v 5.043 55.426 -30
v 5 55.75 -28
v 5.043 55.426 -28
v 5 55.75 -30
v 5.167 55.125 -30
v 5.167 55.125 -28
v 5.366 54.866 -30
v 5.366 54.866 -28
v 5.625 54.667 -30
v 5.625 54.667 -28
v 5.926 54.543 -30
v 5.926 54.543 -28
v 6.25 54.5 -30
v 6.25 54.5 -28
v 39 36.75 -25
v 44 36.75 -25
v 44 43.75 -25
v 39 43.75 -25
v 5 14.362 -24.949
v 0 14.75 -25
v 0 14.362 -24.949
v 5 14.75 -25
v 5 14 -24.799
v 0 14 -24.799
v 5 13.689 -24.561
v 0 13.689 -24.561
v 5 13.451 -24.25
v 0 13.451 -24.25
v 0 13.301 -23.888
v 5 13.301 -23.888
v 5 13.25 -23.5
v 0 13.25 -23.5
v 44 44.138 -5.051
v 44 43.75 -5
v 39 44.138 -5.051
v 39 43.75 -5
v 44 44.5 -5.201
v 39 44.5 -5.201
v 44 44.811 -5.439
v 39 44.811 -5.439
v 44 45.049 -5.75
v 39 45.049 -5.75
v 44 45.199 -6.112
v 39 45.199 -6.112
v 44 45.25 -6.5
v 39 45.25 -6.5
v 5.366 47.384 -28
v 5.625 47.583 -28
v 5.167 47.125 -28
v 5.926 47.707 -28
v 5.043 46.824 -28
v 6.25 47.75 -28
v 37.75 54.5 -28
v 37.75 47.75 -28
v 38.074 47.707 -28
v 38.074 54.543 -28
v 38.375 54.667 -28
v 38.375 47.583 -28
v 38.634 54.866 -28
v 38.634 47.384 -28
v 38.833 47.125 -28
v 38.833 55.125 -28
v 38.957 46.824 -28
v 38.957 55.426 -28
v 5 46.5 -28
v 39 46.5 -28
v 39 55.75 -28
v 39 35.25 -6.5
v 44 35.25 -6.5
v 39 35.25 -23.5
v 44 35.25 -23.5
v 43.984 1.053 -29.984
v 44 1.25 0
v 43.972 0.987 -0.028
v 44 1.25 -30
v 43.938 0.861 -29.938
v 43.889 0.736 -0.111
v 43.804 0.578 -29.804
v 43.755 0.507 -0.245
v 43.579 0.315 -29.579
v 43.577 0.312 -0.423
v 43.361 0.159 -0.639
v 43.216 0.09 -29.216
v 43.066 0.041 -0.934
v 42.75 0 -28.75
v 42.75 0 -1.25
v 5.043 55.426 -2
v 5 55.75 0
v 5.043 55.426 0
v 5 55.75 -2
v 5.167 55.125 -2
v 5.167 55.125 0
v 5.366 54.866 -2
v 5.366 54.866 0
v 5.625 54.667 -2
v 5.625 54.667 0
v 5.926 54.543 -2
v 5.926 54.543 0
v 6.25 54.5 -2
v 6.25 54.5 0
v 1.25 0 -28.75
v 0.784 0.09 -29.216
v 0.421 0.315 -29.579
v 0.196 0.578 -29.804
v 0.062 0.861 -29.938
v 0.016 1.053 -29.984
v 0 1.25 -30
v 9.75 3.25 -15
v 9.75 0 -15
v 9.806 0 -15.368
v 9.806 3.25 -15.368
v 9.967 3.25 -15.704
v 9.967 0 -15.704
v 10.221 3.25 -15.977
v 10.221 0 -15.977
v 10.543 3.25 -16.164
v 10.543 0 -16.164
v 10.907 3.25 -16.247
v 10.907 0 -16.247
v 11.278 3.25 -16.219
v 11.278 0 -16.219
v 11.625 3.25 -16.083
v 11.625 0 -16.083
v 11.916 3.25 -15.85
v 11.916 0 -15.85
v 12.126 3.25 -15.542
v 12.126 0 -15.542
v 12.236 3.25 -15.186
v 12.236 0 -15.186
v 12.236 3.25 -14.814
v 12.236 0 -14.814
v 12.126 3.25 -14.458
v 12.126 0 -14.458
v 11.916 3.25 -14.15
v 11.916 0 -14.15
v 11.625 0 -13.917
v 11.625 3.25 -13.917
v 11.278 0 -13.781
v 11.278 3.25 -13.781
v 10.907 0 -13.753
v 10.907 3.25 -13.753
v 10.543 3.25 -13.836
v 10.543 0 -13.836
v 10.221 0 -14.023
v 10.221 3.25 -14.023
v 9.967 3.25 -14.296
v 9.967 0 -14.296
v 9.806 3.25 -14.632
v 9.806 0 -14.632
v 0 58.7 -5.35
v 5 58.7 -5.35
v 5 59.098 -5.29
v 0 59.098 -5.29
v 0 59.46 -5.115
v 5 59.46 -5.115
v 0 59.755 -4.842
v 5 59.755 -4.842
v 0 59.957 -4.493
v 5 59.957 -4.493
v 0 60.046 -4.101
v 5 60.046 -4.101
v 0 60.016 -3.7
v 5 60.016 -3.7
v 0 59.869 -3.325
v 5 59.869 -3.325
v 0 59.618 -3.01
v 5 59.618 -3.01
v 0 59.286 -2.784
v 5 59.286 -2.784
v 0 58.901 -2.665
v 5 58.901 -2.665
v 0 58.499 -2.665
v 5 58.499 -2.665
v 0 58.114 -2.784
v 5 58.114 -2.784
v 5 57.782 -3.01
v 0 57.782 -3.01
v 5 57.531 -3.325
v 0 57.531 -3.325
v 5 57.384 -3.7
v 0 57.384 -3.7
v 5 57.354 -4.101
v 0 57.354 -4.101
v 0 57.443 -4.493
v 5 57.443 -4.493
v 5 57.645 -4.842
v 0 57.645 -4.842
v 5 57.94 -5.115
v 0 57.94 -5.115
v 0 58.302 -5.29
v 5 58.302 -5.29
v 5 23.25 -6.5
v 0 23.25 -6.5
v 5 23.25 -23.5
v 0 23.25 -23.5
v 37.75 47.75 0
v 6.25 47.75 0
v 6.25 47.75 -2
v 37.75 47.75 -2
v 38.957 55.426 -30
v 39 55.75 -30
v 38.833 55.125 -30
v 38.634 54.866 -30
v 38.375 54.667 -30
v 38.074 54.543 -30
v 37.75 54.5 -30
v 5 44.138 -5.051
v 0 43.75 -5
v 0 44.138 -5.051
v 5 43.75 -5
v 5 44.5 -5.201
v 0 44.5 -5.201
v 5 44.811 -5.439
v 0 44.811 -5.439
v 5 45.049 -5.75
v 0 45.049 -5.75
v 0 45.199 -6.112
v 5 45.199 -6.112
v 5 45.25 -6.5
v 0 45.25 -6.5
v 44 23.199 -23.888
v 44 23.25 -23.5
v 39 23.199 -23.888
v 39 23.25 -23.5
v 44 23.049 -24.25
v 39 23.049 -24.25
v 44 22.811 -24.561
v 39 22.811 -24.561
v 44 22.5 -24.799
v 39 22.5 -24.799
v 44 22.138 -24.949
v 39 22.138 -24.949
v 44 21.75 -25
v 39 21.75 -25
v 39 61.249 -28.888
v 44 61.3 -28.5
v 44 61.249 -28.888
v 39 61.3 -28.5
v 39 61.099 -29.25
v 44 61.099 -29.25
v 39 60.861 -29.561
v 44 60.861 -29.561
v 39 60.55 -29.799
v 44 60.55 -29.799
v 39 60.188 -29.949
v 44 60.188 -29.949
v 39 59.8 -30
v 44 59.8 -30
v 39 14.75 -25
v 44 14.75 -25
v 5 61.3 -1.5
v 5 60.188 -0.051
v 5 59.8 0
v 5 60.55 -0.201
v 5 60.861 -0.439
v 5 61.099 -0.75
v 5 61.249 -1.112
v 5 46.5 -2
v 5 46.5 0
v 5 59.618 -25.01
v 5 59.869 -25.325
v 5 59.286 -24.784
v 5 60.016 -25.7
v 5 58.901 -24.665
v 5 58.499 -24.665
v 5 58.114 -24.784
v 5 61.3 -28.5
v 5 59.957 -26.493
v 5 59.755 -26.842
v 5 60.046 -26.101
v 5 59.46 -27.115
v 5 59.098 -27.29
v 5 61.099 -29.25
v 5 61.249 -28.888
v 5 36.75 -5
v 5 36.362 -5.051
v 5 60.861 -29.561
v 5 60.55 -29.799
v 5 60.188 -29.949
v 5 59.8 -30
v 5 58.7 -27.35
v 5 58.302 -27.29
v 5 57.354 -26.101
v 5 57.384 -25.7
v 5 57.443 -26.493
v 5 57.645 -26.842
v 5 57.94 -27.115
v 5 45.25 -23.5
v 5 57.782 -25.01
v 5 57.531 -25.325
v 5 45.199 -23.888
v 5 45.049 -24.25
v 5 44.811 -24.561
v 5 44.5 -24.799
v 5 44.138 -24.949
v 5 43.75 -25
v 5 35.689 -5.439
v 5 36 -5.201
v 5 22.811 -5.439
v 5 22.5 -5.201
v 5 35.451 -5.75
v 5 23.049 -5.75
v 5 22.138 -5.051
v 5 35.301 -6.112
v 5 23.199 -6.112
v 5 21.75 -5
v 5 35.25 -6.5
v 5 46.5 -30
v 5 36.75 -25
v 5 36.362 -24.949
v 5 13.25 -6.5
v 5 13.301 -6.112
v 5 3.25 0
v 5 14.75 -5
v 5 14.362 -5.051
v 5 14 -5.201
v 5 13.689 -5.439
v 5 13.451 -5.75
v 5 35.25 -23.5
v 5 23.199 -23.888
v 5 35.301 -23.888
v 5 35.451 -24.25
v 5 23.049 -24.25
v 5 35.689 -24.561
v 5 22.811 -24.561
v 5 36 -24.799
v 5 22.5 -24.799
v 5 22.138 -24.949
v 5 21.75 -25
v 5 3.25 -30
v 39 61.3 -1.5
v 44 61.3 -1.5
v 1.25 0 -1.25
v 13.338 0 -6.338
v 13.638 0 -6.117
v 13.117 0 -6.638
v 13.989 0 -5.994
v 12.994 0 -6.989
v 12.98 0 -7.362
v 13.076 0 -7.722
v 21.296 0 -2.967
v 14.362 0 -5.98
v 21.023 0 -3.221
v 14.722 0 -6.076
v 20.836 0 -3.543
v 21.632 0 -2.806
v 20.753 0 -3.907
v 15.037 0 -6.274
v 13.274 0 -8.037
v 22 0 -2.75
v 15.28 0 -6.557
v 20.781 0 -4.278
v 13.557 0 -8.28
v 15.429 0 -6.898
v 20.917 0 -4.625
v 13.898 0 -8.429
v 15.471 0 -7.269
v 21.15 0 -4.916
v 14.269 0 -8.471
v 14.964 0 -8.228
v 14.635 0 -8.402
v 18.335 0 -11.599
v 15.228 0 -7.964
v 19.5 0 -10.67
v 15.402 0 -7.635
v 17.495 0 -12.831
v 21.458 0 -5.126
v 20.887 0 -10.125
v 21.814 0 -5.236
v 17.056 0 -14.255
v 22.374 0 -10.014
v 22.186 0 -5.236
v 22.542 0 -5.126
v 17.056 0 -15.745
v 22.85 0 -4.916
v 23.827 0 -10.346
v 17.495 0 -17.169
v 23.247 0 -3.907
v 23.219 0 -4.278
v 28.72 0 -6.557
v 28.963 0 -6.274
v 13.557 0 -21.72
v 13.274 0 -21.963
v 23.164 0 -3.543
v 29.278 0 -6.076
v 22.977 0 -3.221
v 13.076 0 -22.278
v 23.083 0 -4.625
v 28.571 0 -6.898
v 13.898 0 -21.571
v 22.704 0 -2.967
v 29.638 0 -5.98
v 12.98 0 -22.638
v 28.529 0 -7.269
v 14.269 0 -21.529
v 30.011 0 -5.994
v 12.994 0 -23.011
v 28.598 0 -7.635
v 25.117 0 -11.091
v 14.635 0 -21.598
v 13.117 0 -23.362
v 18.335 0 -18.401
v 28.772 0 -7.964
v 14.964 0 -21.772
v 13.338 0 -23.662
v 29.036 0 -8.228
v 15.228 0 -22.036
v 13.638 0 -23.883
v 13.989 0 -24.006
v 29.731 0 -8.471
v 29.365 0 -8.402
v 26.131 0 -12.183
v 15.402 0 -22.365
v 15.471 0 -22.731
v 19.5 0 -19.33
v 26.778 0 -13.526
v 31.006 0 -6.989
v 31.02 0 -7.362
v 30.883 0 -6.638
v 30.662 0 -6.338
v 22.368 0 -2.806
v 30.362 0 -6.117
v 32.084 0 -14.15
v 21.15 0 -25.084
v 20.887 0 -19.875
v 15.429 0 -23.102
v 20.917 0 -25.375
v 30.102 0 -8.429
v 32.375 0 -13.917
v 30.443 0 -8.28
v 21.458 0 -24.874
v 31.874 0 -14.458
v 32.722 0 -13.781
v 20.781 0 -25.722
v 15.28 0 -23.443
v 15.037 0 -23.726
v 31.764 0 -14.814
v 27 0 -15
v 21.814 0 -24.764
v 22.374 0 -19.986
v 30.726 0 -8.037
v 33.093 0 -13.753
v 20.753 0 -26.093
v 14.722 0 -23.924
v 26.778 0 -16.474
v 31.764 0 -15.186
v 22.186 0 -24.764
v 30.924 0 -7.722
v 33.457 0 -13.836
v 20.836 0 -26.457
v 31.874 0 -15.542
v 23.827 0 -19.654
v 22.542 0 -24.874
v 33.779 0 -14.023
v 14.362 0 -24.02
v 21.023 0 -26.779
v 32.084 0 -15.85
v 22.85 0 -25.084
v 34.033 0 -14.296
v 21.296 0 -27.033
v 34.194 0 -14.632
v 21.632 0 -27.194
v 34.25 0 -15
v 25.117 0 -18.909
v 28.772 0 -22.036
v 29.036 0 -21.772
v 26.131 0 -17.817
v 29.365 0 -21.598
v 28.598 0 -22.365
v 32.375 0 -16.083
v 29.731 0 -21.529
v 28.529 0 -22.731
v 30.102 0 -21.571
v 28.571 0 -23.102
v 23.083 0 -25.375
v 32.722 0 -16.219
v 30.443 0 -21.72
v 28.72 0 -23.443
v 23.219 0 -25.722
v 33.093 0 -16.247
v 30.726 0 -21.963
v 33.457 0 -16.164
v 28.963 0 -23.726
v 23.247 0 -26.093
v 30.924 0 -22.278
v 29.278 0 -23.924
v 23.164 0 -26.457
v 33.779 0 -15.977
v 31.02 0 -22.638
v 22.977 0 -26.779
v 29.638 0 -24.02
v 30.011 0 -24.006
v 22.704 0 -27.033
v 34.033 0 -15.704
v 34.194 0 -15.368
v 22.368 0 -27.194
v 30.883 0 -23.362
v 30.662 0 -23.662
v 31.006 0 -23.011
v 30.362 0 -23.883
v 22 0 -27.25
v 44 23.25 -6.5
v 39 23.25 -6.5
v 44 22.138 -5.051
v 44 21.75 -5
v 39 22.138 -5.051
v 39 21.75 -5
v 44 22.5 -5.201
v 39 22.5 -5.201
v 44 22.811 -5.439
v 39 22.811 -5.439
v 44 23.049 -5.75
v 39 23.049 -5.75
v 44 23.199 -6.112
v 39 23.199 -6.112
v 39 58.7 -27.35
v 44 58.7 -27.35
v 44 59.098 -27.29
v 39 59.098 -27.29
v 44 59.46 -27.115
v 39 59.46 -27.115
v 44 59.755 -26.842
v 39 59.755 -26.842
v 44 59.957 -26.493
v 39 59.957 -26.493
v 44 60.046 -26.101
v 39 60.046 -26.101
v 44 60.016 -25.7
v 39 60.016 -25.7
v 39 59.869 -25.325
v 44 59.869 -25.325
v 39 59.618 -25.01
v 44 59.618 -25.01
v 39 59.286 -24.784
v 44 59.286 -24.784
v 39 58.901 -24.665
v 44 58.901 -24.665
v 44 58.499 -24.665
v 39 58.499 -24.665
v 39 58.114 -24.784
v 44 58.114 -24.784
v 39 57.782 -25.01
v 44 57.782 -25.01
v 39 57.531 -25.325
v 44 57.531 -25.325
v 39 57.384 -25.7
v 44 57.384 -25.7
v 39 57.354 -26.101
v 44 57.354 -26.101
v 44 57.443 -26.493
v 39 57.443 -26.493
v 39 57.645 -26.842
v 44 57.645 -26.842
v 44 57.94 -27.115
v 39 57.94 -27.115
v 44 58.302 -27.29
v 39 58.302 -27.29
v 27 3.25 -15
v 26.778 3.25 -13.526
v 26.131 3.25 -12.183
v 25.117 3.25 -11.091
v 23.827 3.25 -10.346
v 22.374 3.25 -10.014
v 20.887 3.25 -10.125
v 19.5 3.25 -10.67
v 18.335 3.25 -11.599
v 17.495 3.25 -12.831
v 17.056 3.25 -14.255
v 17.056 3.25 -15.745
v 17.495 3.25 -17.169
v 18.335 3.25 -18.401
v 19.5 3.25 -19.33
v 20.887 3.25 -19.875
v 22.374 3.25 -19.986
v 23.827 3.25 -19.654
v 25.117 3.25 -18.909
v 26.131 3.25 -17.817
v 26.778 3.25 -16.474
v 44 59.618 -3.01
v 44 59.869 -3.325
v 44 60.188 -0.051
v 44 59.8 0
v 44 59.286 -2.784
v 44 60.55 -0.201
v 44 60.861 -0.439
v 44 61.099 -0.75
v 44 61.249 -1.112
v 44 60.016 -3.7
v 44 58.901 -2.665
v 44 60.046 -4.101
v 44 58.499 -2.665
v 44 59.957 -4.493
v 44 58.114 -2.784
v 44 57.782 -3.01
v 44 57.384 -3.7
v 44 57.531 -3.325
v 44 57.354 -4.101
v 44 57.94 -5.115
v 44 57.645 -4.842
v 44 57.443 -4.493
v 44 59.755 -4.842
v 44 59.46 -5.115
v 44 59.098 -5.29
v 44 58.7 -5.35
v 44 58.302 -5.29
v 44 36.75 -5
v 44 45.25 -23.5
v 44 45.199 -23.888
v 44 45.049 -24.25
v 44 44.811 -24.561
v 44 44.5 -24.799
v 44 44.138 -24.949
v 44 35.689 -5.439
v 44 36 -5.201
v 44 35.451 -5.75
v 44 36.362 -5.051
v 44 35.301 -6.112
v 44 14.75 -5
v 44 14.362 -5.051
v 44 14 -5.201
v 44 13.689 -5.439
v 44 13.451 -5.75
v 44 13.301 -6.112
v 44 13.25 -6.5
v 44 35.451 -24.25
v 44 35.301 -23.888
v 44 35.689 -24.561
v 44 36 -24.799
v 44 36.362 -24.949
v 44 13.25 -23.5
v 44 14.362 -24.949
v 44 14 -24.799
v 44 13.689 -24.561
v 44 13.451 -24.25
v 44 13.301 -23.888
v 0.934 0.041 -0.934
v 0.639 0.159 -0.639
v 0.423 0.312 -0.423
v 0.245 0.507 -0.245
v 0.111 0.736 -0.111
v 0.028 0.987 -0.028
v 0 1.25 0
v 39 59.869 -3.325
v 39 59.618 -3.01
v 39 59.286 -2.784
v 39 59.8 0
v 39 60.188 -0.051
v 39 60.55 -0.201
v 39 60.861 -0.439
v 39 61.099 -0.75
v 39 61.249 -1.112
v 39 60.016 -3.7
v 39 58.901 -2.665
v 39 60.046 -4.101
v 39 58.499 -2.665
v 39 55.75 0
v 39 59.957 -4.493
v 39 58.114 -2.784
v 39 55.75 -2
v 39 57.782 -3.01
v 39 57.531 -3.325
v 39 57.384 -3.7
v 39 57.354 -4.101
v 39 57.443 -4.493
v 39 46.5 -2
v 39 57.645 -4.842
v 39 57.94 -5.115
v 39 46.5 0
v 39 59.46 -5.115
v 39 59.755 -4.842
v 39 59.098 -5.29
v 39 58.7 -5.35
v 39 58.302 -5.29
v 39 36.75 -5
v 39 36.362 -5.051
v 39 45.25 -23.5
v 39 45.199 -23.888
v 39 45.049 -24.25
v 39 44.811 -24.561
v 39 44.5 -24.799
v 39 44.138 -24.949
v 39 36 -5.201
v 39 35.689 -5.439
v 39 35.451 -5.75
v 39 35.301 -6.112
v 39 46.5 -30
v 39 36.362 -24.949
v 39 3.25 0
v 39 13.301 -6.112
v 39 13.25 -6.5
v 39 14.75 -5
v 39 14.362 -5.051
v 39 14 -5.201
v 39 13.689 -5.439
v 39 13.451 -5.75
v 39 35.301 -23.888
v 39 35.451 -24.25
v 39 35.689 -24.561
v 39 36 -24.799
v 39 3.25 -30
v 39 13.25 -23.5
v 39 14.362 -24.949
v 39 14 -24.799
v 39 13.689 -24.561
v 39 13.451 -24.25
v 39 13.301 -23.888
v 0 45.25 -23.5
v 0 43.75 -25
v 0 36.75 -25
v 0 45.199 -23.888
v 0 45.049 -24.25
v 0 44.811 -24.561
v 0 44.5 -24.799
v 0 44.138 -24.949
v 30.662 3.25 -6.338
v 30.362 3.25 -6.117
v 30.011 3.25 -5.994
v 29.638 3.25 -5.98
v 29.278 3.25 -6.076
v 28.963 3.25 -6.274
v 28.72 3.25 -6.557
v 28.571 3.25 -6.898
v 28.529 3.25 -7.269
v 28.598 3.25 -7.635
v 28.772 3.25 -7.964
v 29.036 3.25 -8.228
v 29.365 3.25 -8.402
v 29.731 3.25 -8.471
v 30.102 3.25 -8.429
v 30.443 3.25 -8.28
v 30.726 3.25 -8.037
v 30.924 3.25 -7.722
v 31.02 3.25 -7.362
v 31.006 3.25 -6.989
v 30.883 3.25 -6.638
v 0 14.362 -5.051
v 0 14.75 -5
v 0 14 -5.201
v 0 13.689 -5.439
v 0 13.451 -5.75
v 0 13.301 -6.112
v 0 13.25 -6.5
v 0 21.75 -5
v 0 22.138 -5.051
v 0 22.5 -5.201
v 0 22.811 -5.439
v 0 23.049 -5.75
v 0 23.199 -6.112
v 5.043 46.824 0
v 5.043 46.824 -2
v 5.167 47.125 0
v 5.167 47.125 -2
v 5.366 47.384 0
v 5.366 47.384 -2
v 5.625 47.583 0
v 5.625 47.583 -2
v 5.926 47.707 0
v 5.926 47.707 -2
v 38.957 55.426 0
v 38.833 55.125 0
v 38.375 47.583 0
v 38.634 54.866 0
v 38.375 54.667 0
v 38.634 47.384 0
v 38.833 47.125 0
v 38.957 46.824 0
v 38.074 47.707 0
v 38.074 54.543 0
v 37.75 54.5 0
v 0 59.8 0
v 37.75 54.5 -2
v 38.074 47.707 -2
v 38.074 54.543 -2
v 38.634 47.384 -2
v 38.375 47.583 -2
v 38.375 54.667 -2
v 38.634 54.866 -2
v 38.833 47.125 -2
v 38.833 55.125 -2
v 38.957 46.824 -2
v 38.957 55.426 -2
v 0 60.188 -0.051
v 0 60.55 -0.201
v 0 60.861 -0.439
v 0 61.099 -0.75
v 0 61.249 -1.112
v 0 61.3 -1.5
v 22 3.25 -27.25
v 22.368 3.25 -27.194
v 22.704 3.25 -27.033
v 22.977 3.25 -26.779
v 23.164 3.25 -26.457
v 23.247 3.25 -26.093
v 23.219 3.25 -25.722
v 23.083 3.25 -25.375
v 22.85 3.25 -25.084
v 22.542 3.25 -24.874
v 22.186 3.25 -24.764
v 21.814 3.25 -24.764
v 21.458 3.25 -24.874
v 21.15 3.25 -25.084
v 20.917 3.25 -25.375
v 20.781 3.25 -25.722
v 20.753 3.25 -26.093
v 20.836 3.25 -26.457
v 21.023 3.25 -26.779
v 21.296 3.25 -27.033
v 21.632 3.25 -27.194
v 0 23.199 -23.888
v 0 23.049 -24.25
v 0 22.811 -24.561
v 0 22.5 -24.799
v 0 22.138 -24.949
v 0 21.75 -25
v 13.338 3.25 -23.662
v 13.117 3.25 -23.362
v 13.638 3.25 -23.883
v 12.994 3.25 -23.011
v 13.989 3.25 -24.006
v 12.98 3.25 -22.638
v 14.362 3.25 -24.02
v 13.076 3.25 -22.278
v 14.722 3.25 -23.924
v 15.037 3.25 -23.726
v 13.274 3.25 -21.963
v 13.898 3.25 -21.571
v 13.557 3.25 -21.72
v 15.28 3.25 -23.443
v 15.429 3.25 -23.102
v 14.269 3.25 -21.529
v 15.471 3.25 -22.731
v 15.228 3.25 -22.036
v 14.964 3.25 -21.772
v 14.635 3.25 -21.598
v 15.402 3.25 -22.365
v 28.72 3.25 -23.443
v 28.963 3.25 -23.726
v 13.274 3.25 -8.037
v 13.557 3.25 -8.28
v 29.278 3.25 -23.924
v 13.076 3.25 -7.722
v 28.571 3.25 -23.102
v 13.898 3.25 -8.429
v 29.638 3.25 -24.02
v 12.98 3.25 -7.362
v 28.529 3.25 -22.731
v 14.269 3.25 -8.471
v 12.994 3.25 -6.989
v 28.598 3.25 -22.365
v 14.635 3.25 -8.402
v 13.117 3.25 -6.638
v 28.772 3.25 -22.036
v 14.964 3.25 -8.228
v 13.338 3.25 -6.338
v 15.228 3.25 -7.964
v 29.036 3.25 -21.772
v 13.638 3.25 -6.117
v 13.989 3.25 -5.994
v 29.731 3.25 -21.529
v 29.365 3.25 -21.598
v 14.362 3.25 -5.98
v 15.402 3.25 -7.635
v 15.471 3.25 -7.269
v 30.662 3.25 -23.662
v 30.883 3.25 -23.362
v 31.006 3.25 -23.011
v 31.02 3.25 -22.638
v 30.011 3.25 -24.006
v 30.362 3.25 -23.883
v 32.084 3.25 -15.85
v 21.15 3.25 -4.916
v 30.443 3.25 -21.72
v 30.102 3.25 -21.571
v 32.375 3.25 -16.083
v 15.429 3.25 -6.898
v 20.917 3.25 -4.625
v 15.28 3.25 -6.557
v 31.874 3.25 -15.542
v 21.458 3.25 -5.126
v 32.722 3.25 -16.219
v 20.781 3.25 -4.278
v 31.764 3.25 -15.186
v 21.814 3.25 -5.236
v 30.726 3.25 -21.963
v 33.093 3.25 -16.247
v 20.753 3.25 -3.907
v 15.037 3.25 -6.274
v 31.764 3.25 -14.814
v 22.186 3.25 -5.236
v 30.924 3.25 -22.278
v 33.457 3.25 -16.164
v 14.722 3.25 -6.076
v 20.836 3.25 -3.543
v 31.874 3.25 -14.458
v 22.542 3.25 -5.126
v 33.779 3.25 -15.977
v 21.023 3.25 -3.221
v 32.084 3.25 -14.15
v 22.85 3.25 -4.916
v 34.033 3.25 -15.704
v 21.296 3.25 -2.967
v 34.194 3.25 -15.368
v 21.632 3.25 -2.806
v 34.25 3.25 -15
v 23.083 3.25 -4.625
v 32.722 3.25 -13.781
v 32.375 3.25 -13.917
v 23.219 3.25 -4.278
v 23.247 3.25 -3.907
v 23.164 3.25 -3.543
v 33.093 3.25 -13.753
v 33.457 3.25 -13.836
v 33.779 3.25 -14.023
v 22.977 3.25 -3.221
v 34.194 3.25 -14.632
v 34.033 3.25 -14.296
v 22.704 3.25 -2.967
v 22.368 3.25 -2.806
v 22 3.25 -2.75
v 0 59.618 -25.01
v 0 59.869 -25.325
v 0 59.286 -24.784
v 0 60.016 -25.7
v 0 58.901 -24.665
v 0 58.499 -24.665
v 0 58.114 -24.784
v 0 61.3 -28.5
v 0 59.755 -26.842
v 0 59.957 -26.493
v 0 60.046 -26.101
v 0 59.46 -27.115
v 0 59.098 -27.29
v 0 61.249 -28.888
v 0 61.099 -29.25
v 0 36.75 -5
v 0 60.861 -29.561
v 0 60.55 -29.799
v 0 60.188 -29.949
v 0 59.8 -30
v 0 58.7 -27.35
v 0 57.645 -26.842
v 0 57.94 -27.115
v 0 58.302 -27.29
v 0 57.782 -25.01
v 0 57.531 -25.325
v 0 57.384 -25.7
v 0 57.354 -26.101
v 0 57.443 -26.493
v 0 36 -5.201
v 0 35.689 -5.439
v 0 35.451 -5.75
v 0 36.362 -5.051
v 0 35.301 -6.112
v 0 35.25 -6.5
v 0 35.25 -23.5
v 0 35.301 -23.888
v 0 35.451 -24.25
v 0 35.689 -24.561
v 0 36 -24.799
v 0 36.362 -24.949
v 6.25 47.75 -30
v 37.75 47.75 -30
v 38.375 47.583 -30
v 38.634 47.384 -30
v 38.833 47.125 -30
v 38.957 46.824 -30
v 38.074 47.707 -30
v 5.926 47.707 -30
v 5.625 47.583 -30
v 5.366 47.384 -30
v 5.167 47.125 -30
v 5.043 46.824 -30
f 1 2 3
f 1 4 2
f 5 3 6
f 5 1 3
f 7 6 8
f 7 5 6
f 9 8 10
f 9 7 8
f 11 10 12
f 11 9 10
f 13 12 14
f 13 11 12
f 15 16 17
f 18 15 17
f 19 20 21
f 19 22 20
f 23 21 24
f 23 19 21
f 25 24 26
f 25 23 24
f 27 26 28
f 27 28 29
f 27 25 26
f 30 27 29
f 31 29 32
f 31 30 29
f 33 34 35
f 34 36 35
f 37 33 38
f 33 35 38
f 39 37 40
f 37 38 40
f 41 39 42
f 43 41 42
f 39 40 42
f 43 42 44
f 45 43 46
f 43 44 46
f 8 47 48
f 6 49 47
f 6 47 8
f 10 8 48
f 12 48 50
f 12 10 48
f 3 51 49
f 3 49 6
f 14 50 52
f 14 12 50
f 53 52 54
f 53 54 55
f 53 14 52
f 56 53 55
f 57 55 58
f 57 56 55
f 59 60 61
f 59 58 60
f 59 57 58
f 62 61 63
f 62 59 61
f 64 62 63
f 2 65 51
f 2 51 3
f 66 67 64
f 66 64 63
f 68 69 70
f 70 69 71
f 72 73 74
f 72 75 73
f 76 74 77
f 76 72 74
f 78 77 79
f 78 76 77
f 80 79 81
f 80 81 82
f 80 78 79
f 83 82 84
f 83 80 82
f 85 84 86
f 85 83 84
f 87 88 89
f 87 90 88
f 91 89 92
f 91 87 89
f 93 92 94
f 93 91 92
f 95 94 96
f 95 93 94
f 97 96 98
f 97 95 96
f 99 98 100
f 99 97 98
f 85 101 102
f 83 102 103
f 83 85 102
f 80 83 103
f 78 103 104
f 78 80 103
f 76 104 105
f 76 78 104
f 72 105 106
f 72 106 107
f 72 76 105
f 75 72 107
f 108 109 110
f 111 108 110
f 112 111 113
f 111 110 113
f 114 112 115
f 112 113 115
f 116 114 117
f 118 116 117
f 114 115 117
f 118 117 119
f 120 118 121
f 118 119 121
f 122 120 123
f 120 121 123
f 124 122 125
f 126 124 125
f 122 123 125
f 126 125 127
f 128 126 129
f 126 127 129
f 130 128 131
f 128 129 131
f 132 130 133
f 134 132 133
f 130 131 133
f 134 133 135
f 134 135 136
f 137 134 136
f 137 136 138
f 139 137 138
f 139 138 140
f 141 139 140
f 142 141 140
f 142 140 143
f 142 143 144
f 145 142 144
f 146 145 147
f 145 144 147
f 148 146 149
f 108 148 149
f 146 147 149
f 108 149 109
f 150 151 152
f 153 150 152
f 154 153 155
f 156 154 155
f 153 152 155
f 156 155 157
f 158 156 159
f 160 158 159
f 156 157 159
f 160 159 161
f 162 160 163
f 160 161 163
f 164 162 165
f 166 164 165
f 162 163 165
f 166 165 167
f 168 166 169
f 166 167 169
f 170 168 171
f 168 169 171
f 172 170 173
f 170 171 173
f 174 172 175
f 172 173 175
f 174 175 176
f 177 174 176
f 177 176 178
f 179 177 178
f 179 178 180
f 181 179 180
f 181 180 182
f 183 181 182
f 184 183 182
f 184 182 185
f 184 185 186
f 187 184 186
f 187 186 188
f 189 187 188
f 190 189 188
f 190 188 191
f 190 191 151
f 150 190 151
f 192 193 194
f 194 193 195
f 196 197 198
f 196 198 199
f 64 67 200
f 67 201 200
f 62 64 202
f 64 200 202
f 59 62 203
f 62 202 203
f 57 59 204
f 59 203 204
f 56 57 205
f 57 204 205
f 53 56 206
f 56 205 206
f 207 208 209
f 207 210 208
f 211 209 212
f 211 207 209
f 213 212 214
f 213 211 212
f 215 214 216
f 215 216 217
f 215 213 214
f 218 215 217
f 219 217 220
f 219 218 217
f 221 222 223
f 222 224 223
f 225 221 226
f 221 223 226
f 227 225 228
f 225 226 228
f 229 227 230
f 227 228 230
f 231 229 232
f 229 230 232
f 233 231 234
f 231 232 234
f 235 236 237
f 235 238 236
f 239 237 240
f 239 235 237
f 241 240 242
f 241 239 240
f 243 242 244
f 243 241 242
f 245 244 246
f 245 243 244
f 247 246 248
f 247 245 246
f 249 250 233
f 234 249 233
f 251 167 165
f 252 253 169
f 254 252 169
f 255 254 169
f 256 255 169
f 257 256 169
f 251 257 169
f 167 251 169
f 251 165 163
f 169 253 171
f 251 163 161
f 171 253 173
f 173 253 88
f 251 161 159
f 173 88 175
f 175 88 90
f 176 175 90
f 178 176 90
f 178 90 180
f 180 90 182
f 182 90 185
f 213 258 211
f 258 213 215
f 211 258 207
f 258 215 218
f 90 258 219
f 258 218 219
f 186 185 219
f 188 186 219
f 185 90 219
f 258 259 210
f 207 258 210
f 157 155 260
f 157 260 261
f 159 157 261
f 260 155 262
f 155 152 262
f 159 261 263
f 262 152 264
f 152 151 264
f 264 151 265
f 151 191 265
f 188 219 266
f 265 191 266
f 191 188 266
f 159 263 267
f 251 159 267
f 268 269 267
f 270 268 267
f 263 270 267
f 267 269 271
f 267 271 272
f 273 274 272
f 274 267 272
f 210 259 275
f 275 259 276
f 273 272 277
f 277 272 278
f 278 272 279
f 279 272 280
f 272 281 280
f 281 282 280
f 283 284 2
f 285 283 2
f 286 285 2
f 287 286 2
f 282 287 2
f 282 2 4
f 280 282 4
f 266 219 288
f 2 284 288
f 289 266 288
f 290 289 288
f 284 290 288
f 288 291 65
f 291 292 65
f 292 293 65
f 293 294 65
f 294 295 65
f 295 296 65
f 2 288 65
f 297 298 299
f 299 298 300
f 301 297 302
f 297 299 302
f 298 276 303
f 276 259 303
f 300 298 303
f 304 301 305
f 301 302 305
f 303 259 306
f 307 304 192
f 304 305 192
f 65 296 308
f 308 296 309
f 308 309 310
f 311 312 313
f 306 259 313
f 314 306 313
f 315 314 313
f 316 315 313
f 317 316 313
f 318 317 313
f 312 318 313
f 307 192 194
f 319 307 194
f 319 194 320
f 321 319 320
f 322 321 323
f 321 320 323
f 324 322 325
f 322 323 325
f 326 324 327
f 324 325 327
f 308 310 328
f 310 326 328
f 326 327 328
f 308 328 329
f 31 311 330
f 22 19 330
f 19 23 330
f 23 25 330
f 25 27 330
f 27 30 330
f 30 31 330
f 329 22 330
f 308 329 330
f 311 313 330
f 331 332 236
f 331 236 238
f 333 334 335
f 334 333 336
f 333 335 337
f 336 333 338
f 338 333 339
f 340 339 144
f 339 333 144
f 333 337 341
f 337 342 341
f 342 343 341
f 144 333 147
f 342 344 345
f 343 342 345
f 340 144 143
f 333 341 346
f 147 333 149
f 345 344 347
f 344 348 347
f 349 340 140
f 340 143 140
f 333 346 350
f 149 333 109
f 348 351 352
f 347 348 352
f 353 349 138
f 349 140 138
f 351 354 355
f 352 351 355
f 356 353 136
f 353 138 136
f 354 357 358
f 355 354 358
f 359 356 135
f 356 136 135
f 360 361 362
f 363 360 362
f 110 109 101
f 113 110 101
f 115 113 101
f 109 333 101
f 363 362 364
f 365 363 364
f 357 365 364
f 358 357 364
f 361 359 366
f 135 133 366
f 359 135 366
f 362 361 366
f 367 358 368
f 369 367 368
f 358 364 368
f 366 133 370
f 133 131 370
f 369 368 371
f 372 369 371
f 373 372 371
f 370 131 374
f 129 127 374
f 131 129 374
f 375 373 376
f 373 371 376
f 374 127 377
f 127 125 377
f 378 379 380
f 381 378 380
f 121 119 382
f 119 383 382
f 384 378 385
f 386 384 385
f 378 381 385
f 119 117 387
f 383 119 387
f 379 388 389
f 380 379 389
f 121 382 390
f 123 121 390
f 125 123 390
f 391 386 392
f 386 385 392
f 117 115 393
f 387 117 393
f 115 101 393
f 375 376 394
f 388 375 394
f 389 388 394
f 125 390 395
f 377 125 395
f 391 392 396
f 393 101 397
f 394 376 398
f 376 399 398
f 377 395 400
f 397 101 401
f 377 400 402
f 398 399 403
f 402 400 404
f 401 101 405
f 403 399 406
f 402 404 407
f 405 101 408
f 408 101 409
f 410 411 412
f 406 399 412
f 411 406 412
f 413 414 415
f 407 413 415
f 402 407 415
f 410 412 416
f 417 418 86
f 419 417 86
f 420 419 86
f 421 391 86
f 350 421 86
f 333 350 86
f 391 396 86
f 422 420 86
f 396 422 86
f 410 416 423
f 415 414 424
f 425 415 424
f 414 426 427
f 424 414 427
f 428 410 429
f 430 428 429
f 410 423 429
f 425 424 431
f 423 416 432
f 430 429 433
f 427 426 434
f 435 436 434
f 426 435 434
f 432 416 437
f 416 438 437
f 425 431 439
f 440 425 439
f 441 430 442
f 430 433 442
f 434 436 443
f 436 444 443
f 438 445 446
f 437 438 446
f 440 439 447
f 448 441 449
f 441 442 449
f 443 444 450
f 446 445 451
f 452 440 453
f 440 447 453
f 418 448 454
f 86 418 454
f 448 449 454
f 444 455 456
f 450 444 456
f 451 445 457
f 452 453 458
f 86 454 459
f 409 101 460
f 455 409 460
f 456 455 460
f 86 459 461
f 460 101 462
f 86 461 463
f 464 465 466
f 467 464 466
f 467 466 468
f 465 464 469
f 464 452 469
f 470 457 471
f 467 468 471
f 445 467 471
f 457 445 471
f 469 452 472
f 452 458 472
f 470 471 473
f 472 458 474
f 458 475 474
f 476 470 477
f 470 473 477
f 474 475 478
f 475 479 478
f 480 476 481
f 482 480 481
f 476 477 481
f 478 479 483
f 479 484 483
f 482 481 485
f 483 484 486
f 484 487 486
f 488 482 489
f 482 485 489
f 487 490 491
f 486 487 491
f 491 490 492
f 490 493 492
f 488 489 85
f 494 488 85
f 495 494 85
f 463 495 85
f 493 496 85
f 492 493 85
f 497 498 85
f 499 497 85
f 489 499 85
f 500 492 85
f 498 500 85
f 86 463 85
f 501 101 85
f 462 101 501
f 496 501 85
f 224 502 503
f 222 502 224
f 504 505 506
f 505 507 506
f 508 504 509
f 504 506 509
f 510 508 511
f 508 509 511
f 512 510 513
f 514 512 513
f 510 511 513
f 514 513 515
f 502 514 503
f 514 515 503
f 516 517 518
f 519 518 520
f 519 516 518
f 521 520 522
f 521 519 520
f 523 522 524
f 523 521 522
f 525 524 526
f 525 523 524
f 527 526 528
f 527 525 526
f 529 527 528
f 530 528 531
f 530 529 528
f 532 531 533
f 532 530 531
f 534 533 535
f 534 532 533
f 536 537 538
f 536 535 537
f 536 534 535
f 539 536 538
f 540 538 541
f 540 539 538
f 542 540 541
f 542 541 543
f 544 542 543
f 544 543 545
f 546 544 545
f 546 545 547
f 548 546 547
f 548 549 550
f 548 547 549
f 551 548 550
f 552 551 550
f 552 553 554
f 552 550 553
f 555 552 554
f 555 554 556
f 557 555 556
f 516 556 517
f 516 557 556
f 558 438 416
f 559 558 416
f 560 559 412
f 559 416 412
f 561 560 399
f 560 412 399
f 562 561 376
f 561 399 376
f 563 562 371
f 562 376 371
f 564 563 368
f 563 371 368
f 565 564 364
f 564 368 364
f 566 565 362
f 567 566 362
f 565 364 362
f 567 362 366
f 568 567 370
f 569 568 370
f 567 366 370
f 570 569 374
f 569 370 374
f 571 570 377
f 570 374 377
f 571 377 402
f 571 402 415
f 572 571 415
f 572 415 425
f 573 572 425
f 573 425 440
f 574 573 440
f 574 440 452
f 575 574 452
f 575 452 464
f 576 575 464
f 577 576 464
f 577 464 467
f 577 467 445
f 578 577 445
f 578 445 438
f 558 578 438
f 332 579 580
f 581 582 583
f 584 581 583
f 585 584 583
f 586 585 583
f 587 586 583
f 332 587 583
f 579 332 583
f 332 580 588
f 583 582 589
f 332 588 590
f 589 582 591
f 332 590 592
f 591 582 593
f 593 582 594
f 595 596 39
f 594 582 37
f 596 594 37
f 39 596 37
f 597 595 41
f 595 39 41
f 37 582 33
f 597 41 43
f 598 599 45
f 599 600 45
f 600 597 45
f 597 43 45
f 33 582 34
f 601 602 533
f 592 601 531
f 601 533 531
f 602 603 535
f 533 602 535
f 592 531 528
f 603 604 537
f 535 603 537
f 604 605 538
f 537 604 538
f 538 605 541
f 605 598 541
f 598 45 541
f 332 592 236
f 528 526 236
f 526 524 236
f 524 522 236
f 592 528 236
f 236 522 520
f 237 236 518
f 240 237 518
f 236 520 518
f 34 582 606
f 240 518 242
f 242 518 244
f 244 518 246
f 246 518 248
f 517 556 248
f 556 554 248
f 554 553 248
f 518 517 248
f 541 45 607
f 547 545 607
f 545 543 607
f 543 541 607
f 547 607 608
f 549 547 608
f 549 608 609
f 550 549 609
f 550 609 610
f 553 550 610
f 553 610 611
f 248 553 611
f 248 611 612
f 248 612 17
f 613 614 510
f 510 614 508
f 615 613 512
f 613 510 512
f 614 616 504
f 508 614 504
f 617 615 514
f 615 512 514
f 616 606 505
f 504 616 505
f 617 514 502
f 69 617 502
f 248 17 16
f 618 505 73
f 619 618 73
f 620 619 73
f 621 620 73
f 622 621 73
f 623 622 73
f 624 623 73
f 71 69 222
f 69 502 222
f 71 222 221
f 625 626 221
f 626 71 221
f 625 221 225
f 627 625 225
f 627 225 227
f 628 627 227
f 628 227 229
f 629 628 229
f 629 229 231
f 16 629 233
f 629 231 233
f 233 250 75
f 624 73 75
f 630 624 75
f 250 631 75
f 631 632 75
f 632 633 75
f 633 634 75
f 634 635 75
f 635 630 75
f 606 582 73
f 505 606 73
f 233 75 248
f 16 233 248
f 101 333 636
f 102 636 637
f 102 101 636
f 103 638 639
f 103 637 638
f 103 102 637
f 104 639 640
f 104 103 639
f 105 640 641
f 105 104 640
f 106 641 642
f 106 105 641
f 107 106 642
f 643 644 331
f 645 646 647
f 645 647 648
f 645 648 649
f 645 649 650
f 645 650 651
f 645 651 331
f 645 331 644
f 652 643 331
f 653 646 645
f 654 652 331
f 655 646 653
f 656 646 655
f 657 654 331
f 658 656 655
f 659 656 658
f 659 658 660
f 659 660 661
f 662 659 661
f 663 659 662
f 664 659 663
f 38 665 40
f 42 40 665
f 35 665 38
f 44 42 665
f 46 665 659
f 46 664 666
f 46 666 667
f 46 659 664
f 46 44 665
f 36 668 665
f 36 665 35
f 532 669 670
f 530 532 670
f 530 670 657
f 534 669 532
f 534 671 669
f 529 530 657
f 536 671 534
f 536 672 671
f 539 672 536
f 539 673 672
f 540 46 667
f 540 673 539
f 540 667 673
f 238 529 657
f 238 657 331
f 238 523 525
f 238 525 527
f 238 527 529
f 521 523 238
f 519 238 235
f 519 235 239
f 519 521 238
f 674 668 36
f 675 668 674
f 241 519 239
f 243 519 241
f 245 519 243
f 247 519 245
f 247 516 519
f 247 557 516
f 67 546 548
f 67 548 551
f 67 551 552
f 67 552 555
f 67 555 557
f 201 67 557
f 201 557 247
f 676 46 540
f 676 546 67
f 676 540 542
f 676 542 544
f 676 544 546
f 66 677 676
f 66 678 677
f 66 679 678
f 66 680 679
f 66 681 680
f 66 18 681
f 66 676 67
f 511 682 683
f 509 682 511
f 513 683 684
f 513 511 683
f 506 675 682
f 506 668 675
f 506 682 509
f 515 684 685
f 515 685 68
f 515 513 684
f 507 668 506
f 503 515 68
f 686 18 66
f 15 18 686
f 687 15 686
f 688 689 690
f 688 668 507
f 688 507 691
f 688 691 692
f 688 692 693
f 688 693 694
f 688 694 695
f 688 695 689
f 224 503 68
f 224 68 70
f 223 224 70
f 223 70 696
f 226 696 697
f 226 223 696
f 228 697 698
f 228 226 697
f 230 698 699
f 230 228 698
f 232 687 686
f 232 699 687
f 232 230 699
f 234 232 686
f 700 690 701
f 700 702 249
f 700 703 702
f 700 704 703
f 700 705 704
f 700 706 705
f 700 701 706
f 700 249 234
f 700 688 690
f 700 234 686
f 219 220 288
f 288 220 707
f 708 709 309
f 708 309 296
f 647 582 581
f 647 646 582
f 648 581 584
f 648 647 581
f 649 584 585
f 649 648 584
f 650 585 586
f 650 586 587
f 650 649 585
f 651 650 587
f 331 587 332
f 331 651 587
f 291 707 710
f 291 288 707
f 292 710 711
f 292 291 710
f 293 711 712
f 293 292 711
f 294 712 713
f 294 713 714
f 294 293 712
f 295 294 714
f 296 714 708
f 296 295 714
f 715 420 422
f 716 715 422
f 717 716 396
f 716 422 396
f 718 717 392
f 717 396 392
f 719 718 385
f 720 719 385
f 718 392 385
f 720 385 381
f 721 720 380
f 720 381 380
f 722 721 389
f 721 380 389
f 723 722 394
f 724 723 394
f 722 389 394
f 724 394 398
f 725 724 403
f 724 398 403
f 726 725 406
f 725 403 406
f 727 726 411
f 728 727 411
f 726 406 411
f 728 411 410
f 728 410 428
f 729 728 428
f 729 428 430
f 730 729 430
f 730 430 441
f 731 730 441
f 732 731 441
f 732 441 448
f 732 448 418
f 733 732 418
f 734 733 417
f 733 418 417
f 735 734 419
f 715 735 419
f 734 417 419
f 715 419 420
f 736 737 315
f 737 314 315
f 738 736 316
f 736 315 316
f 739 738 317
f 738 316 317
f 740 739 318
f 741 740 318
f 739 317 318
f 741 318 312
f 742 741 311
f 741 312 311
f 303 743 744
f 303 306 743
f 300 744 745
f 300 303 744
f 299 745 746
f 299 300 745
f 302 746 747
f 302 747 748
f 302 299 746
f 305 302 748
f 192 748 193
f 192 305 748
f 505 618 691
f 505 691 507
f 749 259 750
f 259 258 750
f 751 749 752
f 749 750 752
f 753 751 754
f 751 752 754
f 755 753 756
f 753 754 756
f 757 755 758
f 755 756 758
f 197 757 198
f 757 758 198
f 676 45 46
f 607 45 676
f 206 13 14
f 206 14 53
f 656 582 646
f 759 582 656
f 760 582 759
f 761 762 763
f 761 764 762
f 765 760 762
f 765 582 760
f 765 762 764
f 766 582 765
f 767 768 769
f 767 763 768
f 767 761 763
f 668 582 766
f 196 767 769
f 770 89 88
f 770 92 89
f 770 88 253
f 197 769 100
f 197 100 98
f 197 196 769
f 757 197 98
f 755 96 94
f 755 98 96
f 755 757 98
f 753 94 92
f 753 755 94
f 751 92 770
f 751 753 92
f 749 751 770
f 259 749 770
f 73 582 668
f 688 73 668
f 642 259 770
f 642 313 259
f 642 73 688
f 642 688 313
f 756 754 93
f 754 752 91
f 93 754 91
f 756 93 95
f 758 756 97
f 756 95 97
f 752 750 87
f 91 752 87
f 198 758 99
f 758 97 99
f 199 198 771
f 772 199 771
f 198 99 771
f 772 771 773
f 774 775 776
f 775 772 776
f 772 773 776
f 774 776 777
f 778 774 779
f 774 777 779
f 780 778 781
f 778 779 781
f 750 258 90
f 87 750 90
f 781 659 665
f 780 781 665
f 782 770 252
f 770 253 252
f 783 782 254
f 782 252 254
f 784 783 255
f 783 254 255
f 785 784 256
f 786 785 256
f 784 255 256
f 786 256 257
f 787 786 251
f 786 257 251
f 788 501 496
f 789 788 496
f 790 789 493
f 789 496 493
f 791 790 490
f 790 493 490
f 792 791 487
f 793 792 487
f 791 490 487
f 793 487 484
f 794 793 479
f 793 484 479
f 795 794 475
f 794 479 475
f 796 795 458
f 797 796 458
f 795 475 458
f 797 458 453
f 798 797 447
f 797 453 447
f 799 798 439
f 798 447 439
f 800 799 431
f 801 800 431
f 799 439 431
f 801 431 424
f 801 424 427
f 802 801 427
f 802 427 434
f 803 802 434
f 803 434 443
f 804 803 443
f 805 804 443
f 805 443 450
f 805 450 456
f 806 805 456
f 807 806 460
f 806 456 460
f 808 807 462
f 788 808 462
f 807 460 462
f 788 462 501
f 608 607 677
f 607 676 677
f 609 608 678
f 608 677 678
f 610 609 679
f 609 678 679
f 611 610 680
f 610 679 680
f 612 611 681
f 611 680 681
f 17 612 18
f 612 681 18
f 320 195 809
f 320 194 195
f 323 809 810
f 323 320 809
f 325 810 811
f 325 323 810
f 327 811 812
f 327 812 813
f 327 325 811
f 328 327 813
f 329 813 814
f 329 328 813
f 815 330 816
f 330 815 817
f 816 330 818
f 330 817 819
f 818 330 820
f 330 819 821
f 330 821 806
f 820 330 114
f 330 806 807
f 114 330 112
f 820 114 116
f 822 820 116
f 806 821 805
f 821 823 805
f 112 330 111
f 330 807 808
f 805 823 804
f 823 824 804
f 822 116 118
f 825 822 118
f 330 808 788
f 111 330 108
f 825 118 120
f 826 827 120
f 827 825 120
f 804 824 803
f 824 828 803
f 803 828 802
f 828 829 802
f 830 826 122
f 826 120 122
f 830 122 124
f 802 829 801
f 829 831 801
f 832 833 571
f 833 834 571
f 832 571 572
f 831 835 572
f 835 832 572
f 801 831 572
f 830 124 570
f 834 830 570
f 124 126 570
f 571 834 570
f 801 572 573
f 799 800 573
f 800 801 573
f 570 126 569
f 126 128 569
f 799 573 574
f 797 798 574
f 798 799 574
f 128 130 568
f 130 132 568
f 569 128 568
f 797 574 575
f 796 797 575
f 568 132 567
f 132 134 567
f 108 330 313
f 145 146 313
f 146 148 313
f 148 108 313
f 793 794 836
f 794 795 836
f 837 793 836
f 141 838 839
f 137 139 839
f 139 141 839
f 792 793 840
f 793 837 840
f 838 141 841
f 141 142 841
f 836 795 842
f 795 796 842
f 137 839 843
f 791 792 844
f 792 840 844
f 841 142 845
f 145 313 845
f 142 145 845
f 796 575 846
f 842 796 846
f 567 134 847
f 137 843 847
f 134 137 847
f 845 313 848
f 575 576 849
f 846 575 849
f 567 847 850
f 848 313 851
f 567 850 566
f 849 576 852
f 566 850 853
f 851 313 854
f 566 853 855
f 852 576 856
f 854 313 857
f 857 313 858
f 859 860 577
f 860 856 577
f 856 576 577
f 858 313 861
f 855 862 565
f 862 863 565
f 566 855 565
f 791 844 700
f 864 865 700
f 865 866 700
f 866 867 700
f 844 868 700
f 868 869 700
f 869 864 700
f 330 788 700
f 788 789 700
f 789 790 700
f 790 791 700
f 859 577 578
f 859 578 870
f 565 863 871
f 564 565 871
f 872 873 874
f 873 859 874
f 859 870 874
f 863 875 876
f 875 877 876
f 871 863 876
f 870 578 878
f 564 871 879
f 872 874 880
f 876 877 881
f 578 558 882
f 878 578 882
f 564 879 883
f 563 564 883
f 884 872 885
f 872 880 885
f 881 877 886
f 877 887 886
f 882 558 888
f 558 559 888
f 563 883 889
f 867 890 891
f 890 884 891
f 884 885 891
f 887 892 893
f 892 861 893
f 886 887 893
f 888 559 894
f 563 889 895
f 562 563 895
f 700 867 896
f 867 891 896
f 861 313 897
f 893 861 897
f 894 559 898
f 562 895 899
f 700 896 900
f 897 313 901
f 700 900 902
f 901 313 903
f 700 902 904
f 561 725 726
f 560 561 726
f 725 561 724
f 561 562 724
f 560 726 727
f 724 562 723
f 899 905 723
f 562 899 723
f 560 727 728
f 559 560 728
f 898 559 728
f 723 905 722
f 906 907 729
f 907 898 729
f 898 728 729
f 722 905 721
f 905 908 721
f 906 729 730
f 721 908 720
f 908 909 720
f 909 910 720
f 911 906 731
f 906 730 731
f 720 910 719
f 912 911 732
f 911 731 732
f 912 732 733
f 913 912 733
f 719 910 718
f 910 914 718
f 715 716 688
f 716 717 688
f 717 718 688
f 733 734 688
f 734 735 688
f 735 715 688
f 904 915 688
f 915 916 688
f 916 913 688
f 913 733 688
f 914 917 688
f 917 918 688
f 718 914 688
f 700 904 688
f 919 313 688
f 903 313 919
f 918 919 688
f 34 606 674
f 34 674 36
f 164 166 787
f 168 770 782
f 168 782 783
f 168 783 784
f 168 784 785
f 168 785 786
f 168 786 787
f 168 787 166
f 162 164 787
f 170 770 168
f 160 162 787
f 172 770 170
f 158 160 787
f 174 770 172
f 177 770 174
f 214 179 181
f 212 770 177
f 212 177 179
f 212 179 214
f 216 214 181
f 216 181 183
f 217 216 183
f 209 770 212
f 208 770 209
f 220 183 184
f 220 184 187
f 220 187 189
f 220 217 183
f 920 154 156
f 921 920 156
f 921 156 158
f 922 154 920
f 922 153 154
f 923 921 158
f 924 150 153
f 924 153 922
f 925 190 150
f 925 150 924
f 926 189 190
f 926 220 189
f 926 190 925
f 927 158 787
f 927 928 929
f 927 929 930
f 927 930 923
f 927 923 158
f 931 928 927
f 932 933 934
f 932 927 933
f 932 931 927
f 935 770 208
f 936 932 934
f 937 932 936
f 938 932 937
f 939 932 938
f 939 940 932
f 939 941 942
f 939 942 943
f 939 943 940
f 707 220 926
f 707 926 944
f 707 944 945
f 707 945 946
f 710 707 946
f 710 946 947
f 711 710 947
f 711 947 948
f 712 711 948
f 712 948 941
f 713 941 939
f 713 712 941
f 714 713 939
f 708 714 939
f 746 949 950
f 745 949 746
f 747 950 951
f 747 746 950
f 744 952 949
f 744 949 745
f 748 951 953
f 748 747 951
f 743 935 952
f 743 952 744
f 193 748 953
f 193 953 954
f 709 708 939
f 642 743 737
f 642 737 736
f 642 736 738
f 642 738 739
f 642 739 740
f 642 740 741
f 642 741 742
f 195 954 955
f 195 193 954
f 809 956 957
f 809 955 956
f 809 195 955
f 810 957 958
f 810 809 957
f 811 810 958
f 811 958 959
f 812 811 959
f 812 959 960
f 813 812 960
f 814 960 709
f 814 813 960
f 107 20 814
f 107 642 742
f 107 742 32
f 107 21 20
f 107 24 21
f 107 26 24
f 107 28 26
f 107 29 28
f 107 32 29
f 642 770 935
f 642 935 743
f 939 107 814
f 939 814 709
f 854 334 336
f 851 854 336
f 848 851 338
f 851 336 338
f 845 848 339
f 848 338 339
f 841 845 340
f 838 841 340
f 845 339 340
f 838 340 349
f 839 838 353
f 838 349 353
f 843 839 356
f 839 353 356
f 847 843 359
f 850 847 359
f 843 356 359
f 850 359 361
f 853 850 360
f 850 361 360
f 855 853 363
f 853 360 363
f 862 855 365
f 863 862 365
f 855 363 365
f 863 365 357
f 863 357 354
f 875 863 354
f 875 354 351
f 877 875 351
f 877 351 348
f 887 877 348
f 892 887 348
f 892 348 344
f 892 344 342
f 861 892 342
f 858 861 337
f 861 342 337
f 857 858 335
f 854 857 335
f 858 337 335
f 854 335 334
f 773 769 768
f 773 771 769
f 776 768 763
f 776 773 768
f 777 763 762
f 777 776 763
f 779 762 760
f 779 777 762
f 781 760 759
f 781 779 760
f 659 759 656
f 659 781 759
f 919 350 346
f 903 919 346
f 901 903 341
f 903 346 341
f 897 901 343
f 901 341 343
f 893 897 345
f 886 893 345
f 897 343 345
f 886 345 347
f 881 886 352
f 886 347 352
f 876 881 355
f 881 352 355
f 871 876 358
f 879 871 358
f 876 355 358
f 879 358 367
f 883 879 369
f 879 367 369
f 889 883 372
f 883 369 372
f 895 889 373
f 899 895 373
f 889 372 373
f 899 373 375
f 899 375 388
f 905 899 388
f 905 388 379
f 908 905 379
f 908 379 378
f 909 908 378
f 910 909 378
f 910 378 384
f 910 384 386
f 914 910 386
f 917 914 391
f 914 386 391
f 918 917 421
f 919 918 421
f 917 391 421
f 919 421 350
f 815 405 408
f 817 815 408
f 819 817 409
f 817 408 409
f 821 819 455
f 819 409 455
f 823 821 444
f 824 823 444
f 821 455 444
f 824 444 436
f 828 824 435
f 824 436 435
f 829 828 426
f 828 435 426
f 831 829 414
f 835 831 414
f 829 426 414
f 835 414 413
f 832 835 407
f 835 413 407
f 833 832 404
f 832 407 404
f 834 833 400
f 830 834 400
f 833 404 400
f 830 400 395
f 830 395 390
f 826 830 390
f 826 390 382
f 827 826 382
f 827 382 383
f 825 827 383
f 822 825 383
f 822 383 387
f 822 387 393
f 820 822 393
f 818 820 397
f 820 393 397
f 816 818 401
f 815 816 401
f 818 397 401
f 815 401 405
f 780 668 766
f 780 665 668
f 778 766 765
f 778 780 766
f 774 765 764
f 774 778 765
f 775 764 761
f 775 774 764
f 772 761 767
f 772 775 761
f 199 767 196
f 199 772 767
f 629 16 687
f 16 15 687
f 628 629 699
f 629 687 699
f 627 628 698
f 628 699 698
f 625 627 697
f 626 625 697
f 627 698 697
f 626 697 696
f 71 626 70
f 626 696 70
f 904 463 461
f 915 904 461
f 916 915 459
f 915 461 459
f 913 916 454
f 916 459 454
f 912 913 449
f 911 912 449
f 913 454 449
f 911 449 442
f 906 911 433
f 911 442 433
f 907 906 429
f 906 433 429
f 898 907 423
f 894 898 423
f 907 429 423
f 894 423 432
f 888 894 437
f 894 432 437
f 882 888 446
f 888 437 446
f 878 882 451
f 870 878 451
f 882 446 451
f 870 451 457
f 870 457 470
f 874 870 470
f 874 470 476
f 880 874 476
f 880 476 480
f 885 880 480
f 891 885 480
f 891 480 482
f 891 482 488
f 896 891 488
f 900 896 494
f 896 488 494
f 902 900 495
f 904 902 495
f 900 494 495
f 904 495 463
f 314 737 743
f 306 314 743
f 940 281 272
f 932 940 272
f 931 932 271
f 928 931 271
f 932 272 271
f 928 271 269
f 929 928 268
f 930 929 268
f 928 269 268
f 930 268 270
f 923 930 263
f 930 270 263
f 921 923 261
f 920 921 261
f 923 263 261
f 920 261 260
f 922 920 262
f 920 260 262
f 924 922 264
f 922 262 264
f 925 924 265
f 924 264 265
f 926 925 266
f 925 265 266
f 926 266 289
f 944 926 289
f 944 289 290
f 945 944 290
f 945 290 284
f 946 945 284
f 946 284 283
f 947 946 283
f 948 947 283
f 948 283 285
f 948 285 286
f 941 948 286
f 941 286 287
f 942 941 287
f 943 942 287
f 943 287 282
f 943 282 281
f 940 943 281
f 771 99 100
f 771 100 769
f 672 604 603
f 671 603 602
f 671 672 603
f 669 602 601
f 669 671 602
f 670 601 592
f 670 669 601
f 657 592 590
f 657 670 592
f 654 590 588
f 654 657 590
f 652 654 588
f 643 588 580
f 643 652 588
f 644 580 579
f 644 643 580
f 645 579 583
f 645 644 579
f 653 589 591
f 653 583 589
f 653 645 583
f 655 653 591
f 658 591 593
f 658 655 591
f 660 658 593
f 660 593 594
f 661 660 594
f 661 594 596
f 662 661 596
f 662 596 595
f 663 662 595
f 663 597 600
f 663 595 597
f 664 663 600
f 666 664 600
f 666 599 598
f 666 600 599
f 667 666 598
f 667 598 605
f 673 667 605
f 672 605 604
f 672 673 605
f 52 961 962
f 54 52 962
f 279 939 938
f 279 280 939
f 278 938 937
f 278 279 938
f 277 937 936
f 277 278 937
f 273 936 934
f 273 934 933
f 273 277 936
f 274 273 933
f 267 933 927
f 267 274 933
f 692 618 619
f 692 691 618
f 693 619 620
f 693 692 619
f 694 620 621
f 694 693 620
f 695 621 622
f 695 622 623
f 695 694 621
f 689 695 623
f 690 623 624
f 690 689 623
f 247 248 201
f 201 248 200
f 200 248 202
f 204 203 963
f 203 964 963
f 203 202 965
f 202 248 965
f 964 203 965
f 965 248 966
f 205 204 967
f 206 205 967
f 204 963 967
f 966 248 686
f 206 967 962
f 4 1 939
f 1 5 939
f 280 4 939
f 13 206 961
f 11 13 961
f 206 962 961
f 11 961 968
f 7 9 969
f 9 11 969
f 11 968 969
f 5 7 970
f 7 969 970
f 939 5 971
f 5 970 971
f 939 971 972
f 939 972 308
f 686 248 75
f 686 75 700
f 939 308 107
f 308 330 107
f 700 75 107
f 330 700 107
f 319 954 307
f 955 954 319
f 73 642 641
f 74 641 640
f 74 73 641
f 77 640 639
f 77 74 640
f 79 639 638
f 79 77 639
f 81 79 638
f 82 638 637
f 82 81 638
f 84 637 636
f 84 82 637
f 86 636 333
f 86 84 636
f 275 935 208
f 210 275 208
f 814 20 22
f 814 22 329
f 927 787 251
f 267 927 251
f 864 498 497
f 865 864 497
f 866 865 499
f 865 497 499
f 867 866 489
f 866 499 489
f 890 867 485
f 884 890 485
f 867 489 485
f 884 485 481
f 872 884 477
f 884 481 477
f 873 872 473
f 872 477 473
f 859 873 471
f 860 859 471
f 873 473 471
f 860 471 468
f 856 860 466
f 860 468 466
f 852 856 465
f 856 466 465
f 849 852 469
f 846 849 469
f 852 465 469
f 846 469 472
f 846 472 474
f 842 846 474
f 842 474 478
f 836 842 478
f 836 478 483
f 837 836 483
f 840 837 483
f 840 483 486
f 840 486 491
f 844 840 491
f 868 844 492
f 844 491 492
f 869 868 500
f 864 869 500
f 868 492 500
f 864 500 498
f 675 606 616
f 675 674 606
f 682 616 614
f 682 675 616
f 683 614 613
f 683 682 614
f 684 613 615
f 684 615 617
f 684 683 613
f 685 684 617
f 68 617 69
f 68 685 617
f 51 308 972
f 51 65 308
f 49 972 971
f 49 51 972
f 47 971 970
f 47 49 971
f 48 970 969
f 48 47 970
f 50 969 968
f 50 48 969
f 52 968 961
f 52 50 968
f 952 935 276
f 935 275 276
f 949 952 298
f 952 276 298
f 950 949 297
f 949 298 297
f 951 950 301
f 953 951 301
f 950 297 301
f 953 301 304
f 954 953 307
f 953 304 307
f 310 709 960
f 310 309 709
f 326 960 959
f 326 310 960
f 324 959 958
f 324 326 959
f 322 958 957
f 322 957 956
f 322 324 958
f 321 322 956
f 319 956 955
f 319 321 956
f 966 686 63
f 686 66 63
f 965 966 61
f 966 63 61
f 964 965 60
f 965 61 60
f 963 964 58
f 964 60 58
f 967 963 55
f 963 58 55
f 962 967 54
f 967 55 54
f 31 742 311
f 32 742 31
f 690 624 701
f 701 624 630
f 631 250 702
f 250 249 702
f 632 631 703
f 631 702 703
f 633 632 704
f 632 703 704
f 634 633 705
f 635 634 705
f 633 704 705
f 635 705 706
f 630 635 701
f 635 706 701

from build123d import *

# Parameters (mm, degrees)
SKETCH1_W            = 44
SKETCH1_H            = 30
BOSS_EXTRUDE1_DEPTH  = 54.5
SKETCH5_W            = 5
SKETCH5_H            = 30
BOSS_EXTRUDE3_DEPTH  = 6.8
SKETCH9_R            = 1.35
CUT_EXTRUDE6_DEPTH   = 6
FILLET1_R            = 1.5
FILLET2_R            = 1.25
SKETCH11_W           = 34
SKETCH11_H           = 26
CUT_EXTRUDE7_DEPTH   = 51.25
SKETCH13_R           = 5
SKETCH13_R_2         = 1.25
CUT_EXTRUDE8_DEPTH   = 3.25
CIRPATTERN1_COUNT    = 8
SKETCH15_W           = 20
SKETCH15_H           = 10
CUT_EXTRUDE10_DEPTH  = 5
FILLET6_R            = 1.5
FILLET6_OF_MIRROR4_R = 1.5
SKETCH16_W           = 34
SKETCH16_H           = 44.5
CUT_EXTRUDE11_DEPTH  = 2
FILLET7_R            = 1.25


with BuildPart() as part:
    # Sketch1 → Boss-Extrude1 (new body)
    with BuildSketch(Plane(origin=(0, 0, 0), x_dir=(1, 0, 0), z_dir=(0, 1, 0))):
        with Locations((22, 15)):
            Rectangle(SKETCH1_W, SKETCH1_H)
    extrude(amount=BOSS_EXTRUDE1_DEPTH)

    # Sketch5 → Boss-Extrude3 (add)
    with BuildSketch(Plane(origin=(0, 54.5, 0), x_dir=(1, 0, 0), z_dir=(0, 1, 0))):
        with Locations((2.5, 15)):
            Rectangle(SKETCH5_W, SKETCH5_H)
    boss_extrude3 = extrude(amount=BOSS_EXTRUDE3_DEPTH)

    # Sketch9 → Cut-Extrude6 (cut, through all)
    with BuildSketch(Plane(origin=(5, 0, 0), x_dir=(0, 0, -1), z_dir=(1, 0, 0))):
        with Locations((26, 58.7)):
            Circle(SKETCH9_R)
        with Locations((4, 58.7)):
            Circle(SKETCH9_R)
    cut_extrude6 = extrude(amount=-CUT_EXTRUDE6_DEPTH, mode=Mode.SUBTRACT)

    # Mirror2: Boss-Extrude3, Cut-Extrude6 across plane
    add(boss_extrude3.mirror(Plane.ZY.offset(-22)))
    add(cut_extrude6.mirror(Plane.ZY.offset(-22)), mode=Mode.SUBTRACT)

    # Fillet1
    fillet1_edges = [part.edges().sort_by_distance(p)[0] for p in [
        (2.5, 61.3, 0),
        (2.5, 61.3, -30),
        (41.5, 61.3, -30),
        (41.5, 61.3, 0),
    ]]
    fillet(fillet1_edges, radius=FILLET1_R)

    # Fillet2
    fillet2_edges = [part.edges().sort_by_distance(p)[0] for p in [
        (22, 0, -30),
        (44, 0, -15),
        (22, 0, 0),
        (0, 0, -15),
    ]]
    fillet(fillet2_edges, radius=FILLET2_R)

    # Sketch11 → Cut-Extrude7 (cut)
    with BuildSketch(Plane(origin=(0, 54.5, 0), x_dir=(1, 0, 0), z_dir=(0, 1, 0))):
        with Locations((22, 15)):
            Rectangle(SKETCH11_W, SKETCH11_H)
    extrude(amount=-CUT_EXTRUDE7_DEPTH, mode=Mode.SUBTRACT)

    # Sketch13 → Cut-Extrude8 (cut)
    with BuildSketch(Plane.XZ):
        with Locations((22, -15)):
            Circle(SKETCH13_R)
        with Locations((33, -15)):
            Circle(SKETCH13_R_2)
    cut_extrude8 = extrude(amount=-CUT_EXTRUDE8_DEPTH, mode=Mode.SUBTRACT)

    # CirPattern1: Cut-Extrude8 ×8 about axis
    cirpattern1_axis = Axis((22, 0, -15), (0, 1, 0))
    for i in range(1, CIRPATTERN1_COUNT):
        add(cut_extrude8.rotate(cirpattern1_axis, i * 360 / CIRPATTERN1_COUNT), mode=Mode.SUBTRACT)

    # Sketch15 → Cut-Extrude10 (cut)
    with BuildSketch(Plane(origin=(44, 0, 0), x_dir=(0, 0, -1), z_dir=(1, 0, 0))):
        with Locations((15, 18.25)):
            Rectangle(SKETCH15_W, SKETCH15_H)
        with Locations((15, 40.25)):
            Rectangle(SKETCH15_W, SKETCH15_H)
    cut_extrude10 = extrude(amount=-CUT_EXTRUDE10_DEPTH, mode=Mode.SUBTRACT)

    # Fillet6
    fillet6_edges = [part.edges().sort_by_distance(p)[0] for p in [
        (41.5, 23.25, -5),
        (41.5, 13.25, -5),
        (41.5, 13.25, -25),
        (41.5, 23.25, -25),
        (41.5, 45.25, -5),
        (41.5, 35.25, -5),
        (41.5, 35.25, -25),
        (41.5, 45.25, -25),
    ]]
    fillet(fillet6_edges, radius=FILLET6_R)

    # Mirror4: Cut-Extrude10 across plane
    add(cut_extrude10.mirror(Plane.ZY.offset(-22)), mode=Mode.SUBTRACT)

    # Fillet6 of Mirror4
    fillet6_of_mirror4_edges = [part.edges().sort_by_distance(p)[0] for p in [
        (2.5, 23.25, -5),
        (2.5, 13.25, -5),
        (2.5, 13.25, -25),
        (2.5, 23.25, -25),
        (2.5, 45.25, -5),
        (2.5, 35.25, -5),
        (2.5, 35.25, -25),
        (2.5, 45.25, -25),
    ]]
    fillet(fillet6_of_mirror4_edges, radius=FILLET6_OF_MIRROR4_R)

    # Sketch16 → Cut-Extrude11 (cut)
    with BuildSketch(Plane.XY):
        with Locations((22, 25.5)):
            Rectangle(SKETCH16_W, SKETCH16_H)
    cut_extrude11 = extrude(amount=-CUT_EXTRUDE11_DEPTH, mode=Mode.SUBTRACT)

    # Mirror5: Cut-Extrude11 across plane
    add(cut_extrude11.mirror(Plane(origin=(0, 0, -15), x_dir=(1, 0, 0), z_dir=(0, 0, -1))), mode=Mode.SUBTRACT)

    # Fillet7
    fillet7_edges = [part.edges().sort_by_distance(p)[0] for p in [
        (5, 54.5, -1),
        (5, 47.75, -1),
        (39, 47.75, -1),
        (5, 47.75, -29),
        (39, 47.75, -29),
        (39, 54.5, -1),
        (39, 54.5, -29),
        (5, 54.5, -29),
    ]]
    fillet(fillet7_edges, radius=FILLET7_R)


solid = part.part
